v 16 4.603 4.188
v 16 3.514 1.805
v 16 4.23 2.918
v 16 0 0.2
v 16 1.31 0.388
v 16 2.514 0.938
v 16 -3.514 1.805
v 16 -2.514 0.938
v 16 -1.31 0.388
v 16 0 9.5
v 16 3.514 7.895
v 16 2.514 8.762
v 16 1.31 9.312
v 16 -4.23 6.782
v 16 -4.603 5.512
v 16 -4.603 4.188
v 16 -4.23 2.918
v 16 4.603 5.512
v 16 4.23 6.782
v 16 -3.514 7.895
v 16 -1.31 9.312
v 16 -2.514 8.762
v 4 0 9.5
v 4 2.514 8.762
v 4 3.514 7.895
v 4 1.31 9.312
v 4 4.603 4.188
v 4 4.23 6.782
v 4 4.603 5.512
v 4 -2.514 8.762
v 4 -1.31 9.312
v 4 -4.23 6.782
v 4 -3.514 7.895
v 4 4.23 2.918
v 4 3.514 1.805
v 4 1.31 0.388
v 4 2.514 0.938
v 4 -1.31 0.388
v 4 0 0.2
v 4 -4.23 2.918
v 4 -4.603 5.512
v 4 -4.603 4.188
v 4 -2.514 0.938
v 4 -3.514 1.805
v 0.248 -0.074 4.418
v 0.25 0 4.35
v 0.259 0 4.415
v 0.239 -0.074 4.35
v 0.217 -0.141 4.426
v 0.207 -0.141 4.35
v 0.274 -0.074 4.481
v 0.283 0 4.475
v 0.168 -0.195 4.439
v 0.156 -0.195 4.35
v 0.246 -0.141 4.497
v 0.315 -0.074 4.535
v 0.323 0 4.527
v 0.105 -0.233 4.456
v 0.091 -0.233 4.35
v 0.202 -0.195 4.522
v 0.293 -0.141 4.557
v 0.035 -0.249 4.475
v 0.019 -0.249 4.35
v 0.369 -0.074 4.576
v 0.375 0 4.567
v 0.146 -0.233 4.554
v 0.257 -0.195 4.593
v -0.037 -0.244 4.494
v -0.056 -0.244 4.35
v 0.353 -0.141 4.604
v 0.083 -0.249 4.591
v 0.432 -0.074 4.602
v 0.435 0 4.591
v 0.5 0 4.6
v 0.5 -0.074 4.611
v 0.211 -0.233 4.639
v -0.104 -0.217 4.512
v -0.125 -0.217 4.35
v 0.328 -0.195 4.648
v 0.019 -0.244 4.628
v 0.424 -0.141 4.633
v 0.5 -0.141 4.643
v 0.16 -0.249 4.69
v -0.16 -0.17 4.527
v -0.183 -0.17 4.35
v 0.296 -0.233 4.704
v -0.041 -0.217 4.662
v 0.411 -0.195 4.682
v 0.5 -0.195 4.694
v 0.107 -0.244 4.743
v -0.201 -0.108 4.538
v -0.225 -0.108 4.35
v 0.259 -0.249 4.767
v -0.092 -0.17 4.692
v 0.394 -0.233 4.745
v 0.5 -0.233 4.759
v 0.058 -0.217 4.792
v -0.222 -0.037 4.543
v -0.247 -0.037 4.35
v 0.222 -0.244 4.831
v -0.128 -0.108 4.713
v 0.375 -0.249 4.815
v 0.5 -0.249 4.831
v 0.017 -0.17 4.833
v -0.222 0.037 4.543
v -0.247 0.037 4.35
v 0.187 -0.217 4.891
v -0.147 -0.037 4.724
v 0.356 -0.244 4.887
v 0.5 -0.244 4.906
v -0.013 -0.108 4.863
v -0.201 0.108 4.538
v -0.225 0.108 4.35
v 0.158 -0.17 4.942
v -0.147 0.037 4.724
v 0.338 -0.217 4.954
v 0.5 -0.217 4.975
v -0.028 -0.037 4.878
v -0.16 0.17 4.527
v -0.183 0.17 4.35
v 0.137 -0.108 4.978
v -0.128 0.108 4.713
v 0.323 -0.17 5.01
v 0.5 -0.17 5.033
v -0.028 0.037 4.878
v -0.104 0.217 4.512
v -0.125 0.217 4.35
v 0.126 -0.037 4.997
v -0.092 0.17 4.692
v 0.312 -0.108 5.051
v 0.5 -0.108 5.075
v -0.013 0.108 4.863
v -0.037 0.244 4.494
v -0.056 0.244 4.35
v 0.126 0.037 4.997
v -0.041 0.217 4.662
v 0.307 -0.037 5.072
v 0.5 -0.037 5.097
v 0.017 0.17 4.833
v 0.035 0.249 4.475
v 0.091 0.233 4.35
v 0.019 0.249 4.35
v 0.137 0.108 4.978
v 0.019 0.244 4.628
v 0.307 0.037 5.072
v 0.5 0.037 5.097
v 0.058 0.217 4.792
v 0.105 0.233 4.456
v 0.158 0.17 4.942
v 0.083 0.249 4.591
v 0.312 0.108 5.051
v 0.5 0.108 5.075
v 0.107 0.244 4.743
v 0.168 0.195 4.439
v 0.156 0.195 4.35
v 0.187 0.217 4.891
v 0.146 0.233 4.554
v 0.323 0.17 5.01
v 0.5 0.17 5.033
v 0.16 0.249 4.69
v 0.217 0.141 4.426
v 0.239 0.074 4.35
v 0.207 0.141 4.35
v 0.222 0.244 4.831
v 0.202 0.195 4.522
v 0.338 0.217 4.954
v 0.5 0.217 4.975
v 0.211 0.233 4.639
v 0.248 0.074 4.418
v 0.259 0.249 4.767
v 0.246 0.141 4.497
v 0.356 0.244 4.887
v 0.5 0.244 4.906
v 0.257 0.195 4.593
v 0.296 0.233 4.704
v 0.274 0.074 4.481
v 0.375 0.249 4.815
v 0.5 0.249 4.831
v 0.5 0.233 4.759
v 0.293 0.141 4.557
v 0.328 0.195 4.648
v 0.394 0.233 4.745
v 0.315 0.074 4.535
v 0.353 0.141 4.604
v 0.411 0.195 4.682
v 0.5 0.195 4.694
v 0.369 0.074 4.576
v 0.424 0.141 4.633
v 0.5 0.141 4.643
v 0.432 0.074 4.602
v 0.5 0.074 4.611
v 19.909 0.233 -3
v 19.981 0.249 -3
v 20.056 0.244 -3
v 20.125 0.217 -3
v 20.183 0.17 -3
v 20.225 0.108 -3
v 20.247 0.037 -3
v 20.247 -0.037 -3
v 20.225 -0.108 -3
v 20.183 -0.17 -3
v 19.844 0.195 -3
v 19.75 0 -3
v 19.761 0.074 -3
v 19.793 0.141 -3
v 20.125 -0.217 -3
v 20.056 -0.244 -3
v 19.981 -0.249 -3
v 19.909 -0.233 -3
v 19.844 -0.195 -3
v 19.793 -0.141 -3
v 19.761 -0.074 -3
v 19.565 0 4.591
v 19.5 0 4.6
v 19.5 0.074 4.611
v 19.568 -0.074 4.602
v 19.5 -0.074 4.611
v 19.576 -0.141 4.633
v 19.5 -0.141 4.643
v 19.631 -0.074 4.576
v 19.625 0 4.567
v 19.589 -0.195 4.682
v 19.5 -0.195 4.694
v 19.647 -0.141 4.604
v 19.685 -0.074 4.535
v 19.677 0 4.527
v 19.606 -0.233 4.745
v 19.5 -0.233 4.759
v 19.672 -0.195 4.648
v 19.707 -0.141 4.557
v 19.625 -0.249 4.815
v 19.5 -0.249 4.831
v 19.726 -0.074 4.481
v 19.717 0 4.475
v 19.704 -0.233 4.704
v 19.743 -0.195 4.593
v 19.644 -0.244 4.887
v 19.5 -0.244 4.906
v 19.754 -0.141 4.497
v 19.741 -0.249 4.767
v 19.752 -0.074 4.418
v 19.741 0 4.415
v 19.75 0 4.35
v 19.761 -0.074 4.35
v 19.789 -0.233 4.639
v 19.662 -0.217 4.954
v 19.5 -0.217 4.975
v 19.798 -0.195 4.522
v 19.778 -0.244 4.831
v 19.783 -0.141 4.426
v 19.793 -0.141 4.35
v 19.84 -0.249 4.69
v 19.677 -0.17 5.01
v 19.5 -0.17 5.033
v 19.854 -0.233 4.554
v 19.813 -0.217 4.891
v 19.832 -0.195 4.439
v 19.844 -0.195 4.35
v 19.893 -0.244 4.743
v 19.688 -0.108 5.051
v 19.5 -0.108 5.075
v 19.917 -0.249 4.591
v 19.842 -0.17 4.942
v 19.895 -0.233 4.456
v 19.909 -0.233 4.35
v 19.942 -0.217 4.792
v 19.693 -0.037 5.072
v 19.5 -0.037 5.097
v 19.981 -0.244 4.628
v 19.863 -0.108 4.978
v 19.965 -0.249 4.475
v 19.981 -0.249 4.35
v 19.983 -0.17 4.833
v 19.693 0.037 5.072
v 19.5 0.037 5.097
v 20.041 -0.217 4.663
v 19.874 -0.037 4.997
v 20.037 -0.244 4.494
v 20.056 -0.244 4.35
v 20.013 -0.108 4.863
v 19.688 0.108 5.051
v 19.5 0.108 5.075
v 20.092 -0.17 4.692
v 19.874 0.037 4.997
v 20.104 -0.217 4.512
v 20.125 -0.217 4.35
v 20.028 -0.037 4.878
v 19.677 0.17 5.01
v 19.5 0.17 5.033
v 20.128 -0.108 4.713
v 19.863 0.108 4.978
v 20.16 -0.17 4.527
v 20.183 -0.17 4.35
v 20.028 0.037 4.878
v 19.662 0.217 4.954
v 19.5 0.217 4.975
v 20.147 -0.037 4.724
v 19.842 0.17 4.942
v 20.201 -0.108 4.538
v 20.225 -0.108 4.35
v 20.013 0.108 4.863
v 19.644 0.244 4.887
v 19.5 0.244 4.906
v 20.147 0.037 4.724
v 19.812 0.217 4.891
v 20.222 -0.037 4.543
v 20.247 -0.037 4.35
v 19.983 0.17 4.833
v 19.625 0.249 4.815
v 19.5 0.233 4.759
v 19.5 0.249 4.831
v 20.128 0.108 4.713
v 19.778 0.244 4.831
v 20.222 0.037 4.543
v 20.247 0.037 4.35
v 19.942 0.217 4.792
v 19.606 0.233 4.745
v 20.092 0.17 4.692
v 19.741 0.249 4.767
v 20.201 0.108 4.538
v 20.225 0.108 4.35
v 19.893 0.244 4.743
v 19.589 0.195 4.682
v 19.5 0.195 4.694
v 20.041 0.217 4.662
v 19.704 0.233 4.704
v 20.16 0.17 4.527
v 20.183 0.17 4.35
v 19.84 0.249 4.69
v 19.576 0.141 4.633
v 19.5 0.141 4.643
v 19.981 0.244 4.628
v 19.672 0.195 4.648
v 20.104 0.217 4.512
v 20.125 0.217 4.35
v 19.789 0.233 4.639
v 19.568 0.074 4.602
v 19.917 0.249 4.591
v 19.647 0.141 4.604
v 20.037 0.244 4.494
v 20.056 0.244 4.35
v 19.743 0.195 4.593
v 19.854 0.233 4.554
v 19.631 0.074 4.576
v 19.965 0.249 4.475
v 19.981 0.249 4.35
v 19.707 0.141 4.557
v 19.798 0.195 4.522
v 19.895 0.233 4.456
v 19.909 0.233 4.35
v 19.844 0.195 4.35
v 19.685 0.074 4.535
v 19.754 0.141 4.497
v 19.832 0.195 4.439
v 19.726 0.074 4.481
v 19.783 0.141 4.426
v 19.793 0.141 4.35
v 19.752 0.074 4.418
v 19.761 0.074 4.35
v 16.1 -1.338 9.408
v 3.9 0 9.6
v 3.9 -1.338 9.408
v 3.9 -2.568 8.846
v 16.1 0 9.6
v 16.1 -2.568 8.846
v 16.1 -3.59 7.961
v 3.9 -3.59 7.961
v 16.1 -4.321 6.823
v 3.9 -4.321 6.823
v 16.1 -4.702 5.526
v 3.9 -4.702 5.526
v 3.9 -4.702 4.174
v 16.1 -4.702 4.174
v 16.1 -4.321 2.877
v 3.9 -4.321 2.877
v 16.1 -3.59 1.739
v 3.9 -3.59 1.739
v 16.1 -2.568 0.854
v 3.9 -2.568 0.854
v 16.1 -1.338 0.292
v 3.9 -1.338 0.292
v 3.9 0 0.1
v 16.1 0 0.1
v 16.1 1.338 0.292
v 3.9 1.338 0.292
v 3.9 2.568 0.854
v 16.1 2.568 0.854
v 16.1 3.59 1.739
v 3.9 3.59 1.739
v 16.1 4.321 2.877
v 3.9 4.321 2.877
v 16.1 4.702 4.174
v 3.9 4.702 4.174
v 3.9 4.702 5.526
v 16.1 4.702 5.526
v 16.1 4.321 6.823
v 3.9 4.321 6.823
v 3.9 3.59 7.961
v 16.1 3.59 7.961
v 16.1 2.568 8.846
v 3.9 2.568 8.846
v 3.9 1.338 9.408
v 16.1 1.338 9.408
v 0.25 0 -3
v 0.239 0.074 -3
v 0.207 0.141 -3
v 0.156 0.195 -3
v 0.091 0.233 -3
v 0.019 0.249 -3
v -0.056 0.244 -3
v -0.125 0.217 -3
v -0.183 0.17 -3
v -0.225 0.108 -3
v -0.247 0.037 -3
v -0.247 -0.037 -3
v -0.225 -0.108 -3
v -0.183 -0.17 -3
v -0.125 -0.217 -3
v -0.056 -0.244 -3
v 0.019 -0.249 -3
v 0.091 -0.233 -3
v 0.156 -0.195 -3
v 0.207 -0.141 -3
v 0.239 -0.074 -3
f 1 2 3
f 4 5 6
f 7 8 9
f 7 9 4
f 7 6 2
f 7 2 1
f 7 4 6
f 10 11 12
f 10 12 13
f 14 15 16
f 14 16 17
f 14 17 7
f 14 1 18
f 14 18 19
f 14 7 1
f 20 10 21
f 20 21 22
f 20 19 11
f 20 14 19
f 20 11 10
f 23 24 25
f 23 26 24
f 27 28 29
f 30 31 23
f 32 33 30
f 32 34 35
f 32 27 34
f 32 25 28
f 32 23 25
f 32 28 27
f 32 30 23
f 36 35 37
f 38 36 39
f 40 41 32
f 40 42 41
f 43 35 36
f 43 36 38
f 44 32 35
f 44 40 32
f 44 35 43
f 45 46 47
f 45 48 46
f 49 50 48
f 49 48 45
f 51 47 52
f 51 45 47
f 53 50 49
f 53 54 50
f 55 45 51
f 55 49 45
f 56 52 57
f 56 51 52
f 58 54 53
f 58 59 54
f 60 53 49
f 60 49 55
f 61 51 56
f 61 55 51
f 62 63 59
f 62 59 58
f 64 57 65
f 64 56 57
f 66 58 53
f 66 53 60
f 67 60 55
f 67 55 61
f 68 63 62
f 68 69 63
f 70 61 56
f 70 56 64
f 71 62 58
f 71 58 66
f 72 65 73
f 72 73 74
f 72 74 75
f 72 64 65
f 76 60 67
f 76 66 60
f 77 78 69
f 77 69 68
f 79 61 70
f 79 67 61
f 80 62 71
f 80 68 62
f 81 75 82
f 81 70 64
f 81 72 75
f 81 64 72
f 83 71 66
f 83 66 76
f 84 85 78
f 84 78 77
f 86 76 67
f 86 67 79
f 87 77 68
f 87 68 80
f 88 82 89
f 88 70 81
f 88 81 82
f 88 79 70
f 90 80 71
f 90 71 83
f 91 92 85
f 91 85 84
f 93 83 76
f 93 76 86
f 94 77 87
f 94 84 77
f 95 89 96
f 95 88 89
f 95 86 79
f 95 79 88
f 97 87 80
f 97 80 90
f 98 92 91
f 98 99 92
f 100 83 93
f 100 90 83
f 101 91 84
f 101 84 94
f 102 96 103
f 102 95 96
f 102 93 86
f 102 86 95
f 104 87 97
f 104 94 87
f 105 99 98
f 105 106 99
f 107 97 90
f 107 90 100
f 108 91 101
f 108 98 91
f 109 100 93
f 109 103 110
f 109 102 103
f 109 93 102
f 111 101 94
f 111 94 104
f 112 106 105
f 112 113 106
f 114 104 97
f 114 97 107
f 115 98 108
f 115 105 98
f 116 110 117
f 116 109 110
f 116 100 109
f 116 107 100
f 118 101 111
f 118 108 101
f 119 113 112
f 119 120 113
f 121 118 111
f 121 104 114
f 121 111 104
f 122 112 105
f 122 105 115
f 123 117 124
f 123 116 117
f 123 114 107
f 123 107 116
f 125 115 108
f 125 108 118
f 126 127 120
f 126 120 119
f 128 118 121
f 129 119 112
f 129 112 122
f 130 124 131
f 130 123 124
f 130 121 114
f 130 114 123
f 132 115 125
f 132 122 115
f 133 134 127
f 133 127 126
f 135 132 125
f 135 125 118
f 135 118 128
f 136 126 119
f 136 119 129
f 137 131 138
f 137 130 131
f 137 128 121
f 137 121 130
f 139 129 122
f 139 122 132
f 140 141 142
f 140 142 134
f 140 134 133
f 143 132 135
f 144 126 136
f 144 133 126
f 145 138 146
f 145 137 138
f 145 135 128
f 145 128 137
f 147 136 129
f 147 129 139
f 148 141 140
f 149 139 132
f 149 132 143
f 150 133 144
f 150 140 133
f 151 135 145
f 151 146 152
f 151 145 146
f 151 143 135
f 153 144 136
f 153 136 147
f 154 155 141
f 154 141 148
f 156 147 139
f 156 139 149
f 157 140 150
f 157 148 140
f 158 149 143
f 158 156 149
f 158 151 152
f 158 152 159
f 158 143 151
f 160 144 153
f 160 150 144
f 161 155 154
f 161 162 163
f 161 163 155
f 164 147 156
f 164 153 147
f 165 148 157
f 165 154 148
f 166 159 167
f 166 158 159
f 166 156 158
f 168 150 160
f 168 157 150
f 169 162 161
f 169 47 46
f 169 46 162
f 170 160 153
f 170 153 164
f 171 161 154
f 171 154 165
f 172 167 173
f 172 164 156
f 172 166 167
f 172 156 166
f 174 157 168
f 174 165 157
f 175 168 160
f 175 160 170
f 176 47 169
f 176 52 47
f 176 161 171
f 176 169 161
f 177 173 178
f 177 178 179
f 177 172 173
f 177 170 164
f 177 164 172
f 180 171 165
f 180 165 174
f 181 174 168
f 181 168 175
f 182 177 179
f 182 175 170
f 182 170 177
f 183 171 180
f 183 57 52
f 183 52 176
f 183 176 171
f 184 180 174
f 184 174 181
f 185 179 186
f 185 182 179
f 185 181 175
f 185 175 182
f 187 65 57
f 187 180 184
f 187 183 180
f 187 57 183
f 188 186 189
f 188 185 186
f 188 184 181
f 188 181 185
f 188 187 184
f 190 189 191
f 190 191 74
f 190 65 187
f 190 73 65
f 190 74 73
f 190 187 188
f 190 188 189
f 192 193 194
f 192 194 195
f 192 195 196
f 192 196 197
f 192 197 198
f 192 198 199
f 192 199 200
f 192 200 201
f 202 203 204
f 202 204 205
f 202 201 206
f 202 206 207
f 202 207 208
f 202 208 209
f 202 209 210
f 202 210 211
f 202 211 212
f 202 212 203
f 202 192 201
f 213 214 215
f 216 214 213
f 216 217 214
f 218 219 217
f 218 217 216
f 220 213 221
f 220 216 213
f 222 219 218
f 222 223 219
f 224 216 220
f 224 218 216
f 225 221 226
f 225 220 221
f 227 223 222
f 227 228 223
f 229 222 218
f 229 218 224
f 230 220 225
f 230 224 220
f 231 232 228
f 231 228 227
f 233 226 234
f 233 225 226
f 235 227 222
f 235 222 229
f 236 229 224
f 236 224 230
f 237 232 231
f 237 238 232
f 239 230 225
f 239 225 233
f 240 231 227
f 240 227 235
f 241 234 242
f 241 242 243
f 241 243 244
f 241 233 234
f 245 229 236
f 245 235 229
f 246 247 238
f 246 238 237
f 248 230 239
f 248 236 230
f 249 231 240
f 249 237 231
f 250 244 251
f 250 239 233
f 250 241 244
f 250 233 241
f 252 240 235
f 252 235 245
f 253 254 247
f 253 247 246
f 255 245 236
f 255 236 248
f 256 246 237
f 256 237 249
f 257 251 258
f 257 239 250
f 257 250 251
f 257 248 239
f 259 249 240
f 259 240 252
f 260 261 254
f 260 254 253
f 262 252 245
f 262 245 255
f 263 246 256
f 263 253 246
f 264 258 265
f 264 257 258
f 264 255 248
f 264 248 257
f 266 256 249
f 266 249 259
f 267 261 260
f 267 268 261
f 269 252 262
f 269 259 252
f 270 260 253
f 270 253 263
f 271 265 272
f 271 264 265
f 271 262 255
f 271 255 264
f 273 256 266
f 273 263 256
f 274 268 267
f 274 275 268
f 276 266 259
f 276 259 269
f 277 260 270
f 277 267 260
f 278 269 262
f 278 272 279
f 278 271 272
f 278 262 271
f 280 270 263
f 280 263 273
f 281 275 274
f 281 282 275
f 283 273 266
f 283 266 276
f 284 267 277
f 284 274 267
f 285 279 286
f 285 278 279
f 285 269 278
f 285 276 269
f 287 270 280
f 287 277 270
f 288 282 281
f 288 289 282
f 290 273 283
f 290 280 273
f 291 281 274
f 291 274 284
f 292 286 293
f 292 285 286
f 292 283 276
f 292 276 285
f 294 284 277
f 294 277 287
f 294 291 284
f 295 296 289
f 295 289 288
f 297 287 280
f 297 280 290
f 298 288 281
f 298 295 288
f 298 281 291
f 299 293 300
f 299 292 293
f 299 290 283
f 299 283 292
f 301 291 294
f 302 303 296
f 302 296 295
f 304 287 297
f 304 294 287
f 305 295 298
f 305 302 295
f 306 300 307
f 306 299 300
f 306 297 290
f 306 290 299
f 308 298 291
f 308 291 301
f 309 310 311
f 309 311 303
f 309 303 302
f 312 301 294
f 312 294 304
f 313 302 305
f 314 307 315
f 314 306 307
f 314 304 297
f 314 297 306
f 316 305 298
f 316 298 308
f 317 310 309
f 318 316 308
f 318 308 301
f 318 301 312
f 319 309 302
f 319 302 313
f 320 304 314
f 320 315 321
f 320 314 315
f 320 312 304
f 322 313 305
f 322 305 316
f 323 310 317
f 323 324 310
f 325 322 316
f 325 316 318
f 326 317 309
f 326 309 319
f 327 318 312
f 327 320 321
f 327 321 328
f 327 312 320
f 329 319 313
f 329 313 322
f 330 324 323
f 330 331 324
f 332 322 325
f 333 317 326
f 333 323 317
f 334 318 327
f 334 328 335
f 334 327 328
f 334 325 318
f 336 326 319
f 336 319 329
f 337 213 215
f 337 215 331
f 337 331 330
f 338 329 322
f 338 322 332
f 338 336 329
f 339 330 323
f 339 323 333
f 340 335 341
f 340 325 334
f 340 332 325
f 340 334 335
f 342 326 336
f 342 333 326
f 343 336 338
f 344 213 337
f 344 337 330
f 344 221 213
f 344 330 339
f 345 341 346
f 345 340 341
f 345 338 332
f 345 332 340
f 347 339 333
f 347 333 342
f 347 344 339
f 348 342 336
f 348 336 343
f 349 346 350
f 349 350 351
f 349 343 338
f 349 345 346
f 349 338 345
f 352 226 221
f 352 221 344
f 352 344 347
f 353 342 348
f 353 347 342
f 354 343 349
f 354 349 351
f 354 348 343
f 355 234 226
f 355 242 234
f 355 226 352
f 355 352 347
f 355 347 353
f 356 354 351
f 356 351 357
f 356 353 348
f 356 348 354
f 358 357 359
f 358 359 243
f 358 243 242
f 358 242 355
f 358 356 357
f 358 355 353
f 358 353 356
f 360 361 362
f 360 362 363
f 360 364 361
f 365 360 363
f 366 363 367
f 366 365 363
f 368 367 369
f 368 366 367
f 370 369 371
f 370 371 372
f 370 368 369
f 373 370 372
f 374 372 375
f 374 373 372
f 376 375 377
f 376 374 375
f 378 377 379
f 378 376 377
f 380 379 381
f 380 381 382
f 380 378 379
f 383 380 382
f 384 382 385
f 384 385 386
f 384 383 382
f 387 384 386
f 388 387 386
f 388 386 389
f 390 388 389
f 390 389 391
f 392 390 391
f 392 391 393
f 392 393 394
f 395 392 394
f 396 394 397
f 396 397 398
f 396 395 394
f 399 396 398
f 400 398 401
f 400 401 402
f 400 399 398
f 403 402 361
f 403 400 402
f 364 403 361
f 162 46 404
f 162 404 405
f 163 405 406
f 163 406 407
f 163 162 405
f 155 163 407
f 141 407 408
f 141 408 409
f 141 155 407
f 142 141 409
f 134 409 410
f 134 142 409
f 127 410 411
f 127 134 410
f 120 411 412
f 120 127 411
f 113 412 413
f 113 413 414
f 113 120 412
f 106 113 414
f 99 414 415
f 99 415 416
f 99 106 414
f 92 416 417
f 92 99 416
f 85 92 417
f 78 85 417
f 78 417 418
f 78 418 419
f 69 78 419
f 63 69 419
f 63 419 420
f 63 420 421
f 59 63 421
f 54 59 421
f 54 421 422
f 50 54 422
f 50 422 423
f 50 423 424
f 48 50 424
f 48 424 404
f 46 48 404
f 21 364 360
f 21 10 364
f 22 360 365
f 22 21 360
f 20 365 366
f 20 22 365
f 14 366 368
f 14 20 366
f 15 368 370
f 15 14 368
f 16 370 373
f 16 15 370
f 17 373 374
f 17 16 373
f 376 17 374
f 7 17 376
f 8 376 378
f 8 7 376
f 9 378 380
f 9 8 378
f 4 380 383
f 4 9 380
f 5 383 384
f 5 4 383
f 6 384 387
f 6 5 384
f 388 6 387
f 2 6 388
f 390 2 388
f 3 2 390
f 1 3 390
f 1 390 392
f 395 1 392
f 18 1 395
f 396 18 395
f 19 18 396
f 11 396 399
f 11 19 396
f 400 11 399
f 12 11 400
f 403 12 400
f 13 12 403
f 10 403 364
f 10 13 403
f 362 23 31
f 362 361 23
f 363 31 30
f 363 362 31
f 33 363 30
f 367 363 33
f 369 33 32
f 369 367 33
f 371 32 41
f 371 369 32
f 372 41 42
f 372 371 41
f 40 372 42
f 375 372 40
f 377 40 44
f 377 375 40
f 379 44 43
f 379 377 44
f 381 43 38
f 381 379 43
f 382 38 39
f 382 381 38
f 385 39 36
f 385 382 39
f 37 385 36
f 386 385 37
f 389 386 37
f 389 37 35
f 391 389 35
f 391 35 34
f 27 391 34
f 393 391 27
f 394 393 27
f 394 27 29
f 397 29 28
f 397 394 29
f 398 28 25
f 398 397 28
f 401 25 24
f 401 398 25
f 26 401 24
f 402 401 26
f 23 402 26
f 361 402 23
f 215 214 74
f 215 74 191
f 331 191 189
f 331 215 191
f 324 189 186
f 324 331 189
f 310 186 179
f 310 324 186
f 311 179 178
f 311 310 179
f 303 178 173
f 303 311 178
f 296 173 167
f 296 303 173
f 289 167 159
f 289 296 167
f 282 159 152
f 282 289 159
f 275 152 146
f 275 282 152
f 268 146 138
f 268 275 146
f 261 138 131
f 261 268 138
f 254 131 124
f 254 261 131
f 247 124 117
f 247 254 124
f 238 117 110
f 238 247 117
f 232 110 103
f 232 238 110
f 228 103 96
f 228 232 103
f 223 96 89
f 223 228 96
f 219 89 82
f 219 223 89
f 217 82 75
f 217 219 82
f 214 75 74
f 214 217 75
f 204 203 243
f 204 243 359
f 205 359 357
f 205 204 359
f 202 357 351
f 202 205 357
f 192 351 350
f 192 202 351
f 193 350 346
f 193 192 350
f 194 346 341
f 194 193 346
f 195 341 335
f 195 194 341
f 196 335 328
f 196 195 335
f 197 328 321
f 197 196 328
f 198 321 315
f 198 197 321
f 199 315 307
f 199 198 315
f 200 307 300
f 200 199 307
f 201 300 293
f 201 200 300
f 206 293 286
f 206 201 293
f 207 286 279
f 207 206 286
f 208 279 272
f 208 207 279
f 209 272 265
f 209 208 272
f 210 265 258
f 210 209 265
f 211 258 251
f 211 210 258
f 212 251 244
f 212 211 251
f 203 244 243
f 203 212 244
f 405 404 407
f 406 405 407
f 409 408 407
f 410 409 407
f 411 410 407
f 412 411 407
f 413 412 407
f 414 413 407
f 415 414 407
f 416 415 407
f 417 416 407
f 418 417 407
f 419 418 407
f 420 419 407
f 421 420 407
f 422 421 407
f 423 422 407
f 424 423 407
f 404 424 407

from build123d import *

# Parameters (mm, degrees)
SKETCH_R = 0.25


with BuildPart() as sweep_body:
    # Sweep: sweep along a path in Sketch001
    with BuildLine(Plane.XZ) as sweep_path:
        Line((0, -3), (0, 4.35))
        ThreePointArc((0, 4.35), (0.146443, 4.70355), (0.49999, 4.85))
        Line((0.49999, 4.85), (19.5, 4.85))
        ThreePointArc((19.5, 4.85), (19.853553, 4.703553), (20, 4.35))
        Line((20, 4.35), (20, -3))
    # Sketch → Sweep (sweep)
    with BuildSketch(Plane.XY.offset(-2)):
        Circle(SKETCH_R)
    sweep(path=sweep_path.line)


with BuildPart() as revolution:
    # Sketch002 → Revolution (revolve)
    with BuildSketch(Plane.XZ):
        Polygon((3.9, 9.6), (16.1, 9.6), (16, 9.5), (16, 4.85), (4, 4.85), (4, 9.5), align=None)
    revolve(axis=Axis((7.611803, 0, 4.85), (1, 0, 0)))


solid = Compound([sweep_body.part, revolution.part])
